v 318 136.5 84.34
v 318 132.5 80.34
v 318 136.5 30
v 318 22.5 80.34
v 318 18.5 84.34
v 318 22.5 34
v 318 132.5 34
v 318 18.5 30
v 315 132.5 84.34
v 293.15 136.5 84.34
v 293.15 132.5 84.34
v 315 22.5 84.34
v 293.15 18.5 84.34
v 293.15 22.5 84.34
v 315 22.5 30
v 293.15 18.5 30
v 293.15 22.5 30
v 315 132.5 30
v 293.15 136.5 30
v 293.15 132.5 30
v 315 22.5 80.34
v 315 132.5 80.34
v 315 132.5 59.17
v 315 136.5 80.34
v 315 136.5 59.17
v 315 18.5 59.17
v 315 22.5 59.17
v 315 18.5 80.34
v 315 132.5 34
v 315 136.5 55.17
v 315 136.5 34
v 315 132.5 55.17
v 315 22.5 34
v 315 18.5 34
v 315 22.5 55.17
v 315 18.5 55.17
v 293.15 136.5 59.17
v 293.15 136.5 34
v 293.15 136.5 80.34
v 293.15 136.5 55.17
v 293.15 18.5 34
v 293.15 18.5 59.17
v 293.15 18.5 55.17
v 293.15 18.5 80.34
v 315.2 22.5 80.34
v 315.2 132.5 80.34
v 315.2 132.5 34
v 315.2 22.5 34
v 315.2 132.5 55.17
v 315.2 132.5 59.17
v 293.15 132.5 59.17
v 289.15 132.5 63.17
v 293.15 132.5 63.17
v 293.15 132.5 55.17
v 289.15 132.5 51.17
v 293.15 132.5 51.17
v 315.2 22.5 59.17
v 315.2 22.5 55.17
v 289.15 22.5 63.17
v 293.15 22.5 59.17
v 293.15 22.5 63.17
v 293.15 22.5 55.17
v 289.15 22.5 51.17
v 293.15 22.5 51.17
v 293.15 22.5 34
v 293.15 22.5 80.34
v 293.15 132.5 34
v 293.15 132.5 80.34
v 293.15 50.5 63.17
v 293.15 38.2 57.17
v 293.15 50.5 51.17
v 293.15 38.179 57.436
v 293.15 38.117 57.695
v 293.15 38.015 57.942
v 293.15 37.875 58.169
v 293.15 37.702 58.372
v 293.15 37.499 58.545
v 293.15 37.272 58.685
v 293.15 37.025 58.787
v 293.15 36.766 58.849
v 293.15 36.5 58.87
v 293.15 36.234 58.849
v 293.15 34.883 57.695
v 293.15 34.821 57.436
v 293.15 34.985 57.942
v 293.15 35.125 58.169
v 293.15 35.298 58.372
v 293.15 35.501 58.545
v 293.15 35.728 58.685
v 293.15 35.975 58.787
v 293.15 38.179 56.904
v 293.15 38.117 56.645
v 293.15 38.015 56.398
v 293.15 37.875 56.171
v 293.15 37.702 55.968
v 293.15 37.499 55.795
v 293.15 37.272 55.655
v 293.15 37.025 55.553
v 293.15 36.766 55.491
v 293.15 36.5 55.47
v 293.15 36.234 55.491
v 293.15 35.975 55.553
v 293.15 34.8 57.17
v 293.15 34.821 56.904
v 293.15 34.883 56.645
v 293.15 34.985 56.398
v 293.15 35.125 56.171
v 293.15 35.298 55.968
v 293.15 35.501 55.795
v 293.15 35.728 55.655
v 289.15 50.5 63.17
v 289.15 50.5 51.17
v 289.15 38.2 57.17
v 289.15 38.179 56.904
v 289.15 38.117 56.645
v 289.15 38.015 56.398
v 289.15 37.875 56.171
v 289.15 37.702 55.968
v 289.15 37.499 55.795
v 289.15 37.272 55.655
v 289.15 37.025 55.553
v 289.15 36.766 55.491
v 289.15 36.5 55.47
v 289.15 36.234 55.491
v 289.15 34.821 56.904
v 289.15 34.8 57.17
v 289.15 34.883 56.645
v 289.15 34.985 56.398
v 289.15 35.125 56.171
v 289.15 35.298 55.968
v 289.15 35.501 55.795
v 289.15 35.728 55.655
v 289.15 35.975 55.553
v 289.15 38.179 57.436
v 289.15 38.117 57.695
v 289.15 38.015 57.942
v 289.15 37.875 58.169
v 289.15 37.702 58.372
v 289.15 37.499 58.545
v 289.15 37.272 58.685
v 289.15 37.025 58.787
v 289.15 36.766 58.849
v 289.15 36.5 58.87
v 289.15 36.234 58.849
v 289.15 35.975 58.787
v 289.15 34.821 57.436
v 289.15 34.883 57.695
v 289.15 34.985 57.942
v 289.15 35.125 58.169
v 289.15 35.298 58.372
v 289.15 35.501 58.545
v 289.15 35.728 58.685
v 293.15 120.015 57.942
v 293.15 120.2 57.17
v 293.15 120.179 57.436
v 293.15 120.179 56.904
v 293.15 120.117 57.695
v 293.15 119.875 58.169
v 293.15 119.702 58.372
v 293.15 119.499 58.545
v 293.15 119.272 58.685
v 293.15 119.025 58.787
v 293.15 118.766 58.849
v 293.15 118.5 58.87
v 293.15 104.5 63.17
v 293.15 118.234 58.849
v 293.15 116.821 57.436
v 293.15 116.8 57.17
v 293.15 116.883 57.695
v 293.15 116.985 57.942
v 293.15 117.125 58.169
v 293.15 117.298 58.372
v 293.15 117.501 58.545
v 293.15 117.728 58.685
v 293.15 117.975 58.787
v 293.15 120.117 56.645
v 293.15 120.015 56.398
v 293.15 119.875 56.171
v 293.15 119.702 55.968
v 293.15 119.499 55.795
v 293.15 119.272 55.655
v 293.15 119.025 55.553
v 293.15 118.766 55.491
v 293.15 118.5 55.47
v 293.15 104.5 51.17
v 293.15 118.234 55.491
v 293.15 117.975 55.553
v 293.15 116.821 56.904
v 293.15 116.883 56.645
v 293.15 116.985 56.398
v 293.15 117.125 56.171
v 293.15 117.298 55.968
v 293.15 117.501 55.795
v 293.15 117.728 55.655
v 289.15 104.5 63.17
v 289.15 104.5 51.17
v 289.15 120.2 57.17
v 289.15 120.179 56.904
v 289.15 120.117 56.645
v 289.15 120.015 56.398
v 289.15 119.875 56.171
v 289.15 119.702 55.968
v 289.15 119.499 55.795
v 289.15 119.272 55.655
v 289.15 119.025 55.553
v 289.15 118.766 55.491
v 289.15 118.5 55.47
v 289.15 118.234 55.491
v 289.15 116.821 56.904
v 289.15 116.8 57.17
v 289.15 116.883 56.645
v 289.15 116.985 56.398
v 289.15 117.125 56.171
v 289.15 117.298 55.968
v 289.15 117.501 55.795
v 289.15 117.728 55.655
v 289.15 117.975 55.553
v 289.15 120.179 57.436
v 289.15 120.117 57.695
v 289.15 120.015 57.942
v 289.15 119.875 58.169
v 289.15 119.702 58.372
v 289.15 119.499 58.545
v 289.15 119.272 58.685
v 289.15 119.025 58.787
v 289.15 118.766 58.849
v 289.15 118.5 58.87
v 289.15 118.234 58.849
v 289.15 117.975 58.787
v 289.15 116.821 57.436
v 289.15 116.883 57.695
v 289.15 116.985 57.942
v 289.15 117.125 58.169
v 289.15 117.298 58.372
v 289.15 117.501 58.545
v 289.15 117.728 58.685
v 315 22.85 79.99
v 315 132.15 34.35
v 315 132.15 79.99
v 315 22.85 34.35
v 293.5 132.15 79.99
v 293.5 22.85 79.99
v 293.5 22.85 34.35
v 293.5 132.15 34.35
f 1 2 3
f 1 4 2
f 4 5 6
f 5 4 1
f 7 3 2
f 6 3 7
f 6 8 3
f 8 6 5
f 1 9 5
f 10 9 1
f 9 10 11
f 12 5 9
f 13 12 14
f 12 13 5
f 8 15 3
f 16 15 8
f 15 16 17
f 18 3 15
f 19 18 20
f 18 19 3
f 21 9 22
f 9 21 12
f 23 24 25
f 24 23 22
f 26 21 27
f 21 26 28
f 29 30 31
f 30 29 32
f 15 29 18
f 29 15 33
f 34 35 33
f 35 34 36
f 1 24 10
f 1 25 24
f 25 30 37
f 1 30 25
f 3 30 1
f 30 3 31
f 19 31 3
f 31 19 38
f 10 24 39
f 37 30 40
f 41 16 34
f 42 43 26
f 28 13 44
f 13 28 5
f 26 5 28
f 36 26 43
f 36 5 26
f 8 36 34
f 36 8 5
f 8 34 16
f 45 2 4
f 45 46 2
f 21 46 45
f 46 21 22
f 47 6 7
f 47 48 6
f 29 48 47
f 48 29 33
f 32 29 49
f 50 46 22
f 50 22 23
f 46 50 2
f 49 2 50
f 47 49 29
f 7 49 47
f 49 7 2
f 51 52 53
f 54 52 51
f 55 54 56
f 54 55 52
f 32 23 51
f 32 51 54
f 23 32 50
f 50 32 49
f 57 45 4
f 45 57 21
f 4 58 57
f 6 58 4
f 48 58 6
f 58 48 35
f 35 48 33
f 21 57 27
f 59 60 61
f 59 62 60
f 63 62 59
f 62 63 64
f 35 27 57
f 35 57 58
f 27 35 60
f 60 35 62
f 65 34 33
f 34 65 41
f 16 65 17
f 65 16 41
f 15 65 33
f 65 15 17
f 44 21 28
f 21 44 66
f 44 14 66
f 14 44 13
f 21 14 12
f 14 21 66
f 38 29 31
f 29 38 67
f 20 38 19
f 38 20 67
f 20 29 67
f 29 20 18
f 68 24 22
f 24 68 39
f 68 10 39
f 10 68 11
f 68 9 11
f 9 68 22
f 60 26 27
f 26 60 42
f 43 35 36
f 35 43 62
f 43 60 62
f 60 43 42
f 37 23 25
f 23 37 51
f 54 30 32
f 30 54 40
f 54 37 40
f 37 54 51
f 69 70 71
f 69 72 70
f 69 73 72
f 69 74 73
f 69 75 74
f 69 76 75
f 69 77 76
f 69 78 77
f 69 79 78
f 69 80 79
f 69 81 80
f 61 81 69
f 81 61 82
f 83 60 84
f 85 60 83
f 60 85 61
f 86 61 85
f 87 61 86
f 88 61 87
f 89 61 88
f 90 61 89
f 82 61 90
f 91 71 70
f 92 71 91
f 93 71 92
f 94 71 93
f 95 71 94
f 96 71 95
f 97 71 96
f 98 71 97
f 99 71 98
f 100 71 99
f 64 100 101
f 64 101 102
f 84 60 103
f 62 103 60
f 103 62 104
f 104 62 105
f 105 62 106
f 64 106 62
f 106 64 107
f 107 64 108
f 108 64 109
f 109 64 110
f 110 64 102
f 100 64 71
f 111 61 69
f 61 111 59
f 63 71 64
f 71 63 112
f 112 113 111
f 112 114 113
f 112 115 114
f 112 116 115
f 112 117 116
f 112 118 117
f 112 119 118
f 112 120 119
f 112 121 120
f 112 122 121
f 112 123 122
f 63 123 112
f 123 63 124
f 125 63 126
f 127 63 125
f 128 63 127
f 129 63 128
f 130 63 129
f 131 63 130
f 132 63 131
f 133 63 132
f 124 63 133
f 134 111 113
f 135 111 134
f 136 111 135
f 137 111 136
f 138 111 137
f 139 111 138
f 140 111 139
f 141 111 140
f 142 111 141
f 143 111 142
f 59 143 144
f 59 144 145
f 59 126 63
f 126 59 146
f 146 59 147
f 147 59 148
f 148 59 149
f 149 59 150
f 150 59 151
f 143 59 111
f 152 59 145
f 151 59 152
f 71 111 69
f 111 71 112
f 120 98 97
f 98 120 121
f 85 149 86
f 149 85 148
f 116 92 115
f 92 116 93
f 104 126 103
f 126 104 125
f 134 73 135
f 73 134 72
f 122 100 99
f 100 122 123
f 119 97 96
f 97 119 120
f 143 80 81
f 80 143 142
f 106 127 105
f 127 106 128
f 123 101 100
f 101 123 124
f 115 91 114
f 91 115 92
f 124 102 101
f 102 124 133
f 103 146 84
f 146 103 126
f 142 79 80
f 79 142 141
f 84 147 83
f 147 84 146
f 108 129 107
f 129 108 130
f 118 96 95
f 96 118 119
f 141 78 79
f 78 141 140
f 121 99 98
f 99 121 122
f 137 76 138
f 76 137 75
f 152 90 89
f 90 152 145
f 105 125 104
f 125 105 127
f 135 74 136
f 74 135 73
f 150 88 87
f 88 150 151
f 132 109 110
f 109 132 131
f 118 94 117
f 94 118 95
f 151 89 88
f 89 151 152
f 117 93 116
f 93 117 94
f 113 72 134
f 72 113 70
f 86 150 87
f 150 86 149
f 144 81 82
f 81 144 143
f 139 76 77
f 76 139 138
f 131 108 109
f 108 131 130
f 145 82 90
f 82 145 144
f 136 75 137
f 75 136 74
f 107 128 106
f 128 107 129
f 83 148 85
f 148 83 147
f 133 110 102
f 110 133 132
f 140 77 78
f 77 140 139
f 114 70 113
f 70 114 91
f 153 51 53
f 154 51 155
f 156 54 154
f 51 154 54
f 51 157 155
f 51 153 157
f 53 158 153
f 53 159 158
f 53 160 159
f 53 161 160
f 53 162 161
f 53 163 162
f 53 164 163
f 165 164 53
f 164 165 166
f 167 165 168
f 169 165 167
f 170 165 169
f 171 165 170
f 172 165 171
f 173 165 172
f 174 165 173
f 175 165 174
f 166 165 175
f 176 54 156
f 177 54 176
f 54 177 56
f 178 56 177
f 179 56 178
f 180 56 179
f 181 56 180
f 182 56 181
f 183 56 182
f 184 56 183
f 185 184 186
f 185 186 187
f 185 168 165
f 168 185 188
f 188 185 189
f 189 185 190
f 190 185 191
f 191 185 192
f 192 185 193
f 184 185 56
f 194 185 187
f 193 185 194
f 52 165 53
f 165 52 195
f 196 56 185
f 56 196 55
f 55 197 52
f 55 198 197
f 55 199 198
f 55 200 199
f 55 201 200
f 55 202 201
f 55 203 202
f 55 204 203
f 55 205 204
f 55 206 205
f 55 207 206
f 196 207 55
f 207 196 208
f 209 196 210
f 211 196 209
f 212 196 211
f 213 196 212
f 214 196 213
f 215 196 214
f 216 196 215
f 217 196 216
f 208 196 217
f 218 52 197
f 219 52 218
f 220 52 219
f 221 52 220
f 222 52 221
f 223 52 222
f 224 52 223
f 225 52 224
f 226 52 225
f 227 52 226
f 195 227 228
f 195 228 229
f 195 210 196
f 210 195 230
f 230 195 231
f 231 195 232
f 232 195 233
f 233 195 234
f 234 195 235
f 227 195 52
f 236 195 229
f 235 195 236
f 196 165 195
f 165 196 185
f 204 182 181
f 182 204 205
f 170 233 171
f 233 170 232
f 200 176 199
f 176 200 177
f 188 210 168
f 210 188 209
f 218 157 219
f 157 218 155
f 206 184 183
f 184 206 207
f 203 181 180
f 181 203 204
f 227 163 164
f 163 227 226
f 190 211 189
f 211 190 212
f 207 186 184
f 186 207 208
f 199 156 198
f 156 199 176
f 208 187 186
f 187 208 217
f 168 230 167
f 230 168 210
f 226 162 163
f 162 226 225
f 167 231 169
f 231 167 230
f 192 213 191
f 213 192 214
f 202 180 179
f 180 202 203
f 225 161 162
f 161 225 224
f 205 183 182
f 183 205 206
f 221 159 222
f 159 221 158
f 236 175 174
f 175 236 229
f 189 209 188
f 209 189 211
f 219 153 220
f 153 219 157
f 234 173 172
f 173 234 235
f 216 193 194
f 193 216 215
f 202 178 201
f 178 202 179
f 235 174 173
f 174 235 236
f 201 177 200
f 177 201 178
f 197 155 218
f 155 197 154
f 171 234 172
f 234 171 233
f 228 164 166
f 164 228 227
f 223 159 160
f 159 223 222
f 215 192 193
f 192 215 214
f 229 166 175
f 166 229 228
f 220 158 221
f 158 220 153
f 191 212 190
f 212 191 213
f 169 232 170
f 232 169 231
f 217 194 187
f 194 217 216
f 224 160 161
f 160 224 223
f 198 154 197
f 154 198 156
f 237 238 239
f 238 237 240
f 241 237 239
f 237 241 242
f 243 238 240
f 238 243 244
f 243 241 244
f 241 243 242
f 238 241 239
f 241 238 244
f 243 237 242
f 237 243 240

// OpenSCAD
// Fully internal NexGen-compatible PSU receiver v0.2
// Shared adapter family stays in front of the X=318 rear inner plane.

$fn = 40;

part = "assembly"; // receiver | clamp | adapter-proxy | assembly
adapter = "server"; // server | flexatx | lop
show_adapter = true;

rear_inner_plane = 318;
rear_shell_plane = 330;
adapter_face = [110.0, 46.34]; // Y width, Z height
adapter_depths = [21.5, 7.2, 11.3];
adapter_clearance = 0.35;
max_adapter_depth = max(adapter_depths);

receiver_wall = 4;
receiver_depth = max_adapter_depth + adapter_clearance + 3;
receiver_outer = [receiver_depth,
                  adapter_face[0] + 2 * receiver_wall,
                  adapter_face[1] + 2 * receiver_wall];
receiver_origin = [rear_inner_plane - receiver_outer[0],
                   (155 - receiver_outer[1]) / 2, 30];

seat_depth = 3;
clamp_size = [4, 28, 12];
m3_clearance_d = 3.4;

function adapter_depth(name) =
    name == "server" ? adapter_depths[0] :
    name == "flexatx" ? adapter_depths[1] : adapter_depths[2];

module x_hole(x, y, z, length, diameter) {
    translate([x, y, z]) rotate([0, 90, 0]) cylinder(h = length, d = diameter);
}

module receiver() {
    difference() {
        union() {
            // Rear seat frame. Its stop remains 12 mm ahead of the exterior.
            translate([rear_inner_plane - seat_depth,
                       receiver_origin[1], receiver_origin[2]])
            difference() {
                cube([seat_depth, receiver_outer[1], receiver_outer[2]]);
                translate([-0.1, receiver_wall, receiver_wall])
                    cube([seat_depth + 0.2, adapter_face[0], adapter_face[1]]);
            }

            // Four longitudinal corner guides accept every adapter depth.
            for (y = [receiver_origin[1],
                      receiver_origin[1] + receiver_outer[1] - receiver_wall],
                 z = [receiver_origin[2],
                      receiver_origin[2] + receiver_outer[2] - receiver_wall])
                translate([receiver_origin[0], y, z])
                    cube([receiver_depth - seat_depth + 0.2,
                          receiver_wall, receiver_wall]);

            // Mid-side guides prevent the thin plates from bowing.
            for (y = [receiver_origin[1],
                      receiver_origin[1] + receiver_outer[1] - receiver_wall])
                translate([receiver_origin[0], y,
                           receiver_origin[2] + receiver_outer[2] / 2 - 2])
                    cube([receiver_depth - seat_depth + 0.2, receiver_wall, 4]);
        }

        for (y = [receiver_origin[1] + 18,
                  receiver_origin[1] + receiver_outer[1] - 18])
            x_hole(receiver_origin[0] - 0.1, y,
                   receiver_origin[2] + receiver_outer[2] / 2,
                   receiver_depth + 0.2, m3_clearance_d);
    }
}

module clamp_bar() {
    difference() {
        cube(clamp_size);
        translate([-0.1, clamp_size[1] / 2, clamp_size[2] / 2])
            rotate([0, 90, 0])
                cylinder(h = clamp_size[0] + 0.2, d = m3_clearance_d);
    }
}

module adapter_proxy(name) {
    depth = adapter_depth(name);
    color(name == "server" ? [0.88, 0.39, 0.08, 0.65] :
          name == "flexatx" ? [0.18, 0.47, 0.85, 0.65] :
                               [0.48, 0.70, 0.25, 0.65])
        translate([rear_inner_plane - seat_depth - depth,
                   receiver_origin[1] + receiver_wall + adapter_clearance,
                   receiver_origin[2] + receiver_wall + adapter_clearance])
            cube([depth,
                  adapter_face[0] - 2 * adapter_clearance,
                  adapter_face[1] - 2 * adapter_clearance]);
}

module clamp_pair_global() {
    for (y = [receiver_origin[1] + 4,
              receiver_origin[1] + receiver_outer[1] - 4 - clamp_size[1]])
        translate([receiver_origin[0] - clamp_size[0], y,
                   receiver_origin[2] + receiver_outer[2] / 2 - clamp_size[2] / 2])
            clamp_bar();
}

if (part == "receiver")
    translate(-receiver_origin) receiver();
else if (part == "clamp")
    clamp_bar();
else if (part == "adapter-proxy")
    translate([-(rear_inner_plane - seat_depth - adapter_depth(adapter)),
               -(receiver_origin[1] + receiver_wall + adapter_clearance),
               -(receiver_origin[2] + receiver_wall + adapter_clearance)])
        adapter_proxy(adapter);
else {
    color([0.20, 0.22, 0.25]) receiver();
    color([0.55, 0.57, 0.61]) clamp_pair_global();
    if (show_adapter) adapter_proxy(adapter);
}

echo("part", part);
echo("adapter", adapter);
echo("shared NexGen-derived face YxZ mm", adapter_face);
echo("supported raw adapter depths mm", adapter_depths);
echo("receiver X bounds mm", [receiver_origin[0], rear_inner_plane]);
echo("distance to external shell plane mm", rear_shell_plane - rear_inner_plane);
echo("receiver print envelope mm", receiver_outer);

assert(receiver_origin[0] >= 0, "PSU receiver exceeds the front of the chassis");
assert(rear_inner_plane < rear_shell_plane,
       "PSU receiver protrudes beyond the exterior shell plane");
assert(receiver_outer[1] <= 155 && receiver_outer[2] <= 195,
       "PSU receiver exceeds the case cross-section");
